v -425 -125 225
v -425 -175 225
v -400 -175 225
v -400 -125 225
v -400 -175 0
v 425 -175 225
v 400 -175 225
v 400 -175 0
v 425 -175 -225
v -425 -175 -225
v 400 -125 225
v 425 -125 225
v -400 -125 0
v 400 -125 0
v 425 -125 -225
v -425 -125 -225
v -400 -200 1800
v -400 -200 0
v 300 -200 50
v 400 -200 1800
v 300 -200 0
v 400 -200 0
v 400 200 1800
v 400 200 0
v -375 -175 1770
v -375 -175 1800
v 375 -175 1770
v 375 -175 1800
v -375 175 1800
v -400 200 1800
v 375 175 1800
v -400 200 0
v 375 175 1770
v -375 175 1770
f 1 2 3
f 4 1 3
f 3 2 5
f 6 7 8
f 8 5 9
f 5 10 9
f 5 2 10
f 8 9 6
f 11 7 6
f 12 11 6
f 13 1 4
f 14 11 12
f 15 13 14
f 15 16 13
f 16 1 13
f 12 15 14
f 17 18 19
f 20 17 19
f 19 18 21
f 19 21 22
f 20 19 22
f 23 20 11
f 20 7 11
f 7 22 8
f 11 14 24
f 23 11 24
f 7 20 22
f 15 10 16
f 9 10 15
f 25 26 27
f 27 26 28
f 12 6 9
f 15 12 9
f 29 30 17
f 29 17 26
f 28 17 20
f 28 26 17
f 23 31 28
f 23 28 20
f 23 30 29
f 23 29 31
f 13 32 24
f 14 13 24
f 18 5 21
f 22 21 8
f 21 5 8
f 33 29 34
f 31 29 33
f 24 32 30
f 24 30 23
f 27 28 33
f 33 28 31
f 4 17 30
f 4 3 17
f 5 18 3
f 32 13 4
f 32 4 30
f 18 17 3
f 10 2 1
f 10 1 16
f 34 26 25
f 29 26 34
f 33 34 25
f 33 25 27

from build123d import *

# Parameters (mm, degrees)
SKETCH_1_W          = 800
SKETCH_1_H          = 400
EXTRUDE_1_DEPTH     = 1800
SKETCH_2_W          = 750
SKETCH_2_H          = 350
CUT_EXTRUDE_1_DEPTH = 30
SKETCH_3_W          = 750
SKETCH_3_H          = 20
EXTRUDE_2_DEPTH     = 800
SKETCH_4_R          = 20
EXTRUDE_3_DEPTH     = 50
SKETCH_5_W          = 850
SKETCH_5_H          = 450
EXTRUDE_4_DEPTH     = 50


with BuildPart() as part:
    # 草图1 → 凸台-拉伸1 (new body)
    with BuildSketch(Plane.XY):
        Rectangle(SKETCH_1_W, SKETCH_1_H)
    extrude(amount=EXTRUDE_1_DEPTH)

    # 草图2 → 切除-拉伸1 (cut)
    with BuildSketch(Plane.XY.offset(1800)):
        Rectangle(SKETCH_2_W, SKETCH_2_H)
    extrude(amount=-CUT_EXTRUDE_1_DEPTH, mode=Mode.SUBTRACT)

    # 草图3 → 凸台-拉伸2 (add)
    with BuildSketch(Plane.XY):
        with Locations((0, -180)):
            Rectangle(SKETCH_3_W, SKETCH_3_H)
    extrude(amount=EXTRUDE_2_DEPTH)

    # 草图4 → 凸台-拉伸3 (add)
    with BuildSketch(Plane.XY):
        with Locations((300, -180)):
            Circle(SKETCH_4_R)
    extrude(amount=EXTRUDE_3_DEPTH)

    # 草图5 → 凸台-拉伸4 (add)
    with BuildSketch(Plane(origin=(0, -175, 0), x_dir=(1, 0, 0), z_dir=(0, 1, 0))):
        Rectangle(SKETCH_5_W, SKETCH_5_H)
    extrude(amount=EXTRUDE_4_DEPTH)


solid = part.part
